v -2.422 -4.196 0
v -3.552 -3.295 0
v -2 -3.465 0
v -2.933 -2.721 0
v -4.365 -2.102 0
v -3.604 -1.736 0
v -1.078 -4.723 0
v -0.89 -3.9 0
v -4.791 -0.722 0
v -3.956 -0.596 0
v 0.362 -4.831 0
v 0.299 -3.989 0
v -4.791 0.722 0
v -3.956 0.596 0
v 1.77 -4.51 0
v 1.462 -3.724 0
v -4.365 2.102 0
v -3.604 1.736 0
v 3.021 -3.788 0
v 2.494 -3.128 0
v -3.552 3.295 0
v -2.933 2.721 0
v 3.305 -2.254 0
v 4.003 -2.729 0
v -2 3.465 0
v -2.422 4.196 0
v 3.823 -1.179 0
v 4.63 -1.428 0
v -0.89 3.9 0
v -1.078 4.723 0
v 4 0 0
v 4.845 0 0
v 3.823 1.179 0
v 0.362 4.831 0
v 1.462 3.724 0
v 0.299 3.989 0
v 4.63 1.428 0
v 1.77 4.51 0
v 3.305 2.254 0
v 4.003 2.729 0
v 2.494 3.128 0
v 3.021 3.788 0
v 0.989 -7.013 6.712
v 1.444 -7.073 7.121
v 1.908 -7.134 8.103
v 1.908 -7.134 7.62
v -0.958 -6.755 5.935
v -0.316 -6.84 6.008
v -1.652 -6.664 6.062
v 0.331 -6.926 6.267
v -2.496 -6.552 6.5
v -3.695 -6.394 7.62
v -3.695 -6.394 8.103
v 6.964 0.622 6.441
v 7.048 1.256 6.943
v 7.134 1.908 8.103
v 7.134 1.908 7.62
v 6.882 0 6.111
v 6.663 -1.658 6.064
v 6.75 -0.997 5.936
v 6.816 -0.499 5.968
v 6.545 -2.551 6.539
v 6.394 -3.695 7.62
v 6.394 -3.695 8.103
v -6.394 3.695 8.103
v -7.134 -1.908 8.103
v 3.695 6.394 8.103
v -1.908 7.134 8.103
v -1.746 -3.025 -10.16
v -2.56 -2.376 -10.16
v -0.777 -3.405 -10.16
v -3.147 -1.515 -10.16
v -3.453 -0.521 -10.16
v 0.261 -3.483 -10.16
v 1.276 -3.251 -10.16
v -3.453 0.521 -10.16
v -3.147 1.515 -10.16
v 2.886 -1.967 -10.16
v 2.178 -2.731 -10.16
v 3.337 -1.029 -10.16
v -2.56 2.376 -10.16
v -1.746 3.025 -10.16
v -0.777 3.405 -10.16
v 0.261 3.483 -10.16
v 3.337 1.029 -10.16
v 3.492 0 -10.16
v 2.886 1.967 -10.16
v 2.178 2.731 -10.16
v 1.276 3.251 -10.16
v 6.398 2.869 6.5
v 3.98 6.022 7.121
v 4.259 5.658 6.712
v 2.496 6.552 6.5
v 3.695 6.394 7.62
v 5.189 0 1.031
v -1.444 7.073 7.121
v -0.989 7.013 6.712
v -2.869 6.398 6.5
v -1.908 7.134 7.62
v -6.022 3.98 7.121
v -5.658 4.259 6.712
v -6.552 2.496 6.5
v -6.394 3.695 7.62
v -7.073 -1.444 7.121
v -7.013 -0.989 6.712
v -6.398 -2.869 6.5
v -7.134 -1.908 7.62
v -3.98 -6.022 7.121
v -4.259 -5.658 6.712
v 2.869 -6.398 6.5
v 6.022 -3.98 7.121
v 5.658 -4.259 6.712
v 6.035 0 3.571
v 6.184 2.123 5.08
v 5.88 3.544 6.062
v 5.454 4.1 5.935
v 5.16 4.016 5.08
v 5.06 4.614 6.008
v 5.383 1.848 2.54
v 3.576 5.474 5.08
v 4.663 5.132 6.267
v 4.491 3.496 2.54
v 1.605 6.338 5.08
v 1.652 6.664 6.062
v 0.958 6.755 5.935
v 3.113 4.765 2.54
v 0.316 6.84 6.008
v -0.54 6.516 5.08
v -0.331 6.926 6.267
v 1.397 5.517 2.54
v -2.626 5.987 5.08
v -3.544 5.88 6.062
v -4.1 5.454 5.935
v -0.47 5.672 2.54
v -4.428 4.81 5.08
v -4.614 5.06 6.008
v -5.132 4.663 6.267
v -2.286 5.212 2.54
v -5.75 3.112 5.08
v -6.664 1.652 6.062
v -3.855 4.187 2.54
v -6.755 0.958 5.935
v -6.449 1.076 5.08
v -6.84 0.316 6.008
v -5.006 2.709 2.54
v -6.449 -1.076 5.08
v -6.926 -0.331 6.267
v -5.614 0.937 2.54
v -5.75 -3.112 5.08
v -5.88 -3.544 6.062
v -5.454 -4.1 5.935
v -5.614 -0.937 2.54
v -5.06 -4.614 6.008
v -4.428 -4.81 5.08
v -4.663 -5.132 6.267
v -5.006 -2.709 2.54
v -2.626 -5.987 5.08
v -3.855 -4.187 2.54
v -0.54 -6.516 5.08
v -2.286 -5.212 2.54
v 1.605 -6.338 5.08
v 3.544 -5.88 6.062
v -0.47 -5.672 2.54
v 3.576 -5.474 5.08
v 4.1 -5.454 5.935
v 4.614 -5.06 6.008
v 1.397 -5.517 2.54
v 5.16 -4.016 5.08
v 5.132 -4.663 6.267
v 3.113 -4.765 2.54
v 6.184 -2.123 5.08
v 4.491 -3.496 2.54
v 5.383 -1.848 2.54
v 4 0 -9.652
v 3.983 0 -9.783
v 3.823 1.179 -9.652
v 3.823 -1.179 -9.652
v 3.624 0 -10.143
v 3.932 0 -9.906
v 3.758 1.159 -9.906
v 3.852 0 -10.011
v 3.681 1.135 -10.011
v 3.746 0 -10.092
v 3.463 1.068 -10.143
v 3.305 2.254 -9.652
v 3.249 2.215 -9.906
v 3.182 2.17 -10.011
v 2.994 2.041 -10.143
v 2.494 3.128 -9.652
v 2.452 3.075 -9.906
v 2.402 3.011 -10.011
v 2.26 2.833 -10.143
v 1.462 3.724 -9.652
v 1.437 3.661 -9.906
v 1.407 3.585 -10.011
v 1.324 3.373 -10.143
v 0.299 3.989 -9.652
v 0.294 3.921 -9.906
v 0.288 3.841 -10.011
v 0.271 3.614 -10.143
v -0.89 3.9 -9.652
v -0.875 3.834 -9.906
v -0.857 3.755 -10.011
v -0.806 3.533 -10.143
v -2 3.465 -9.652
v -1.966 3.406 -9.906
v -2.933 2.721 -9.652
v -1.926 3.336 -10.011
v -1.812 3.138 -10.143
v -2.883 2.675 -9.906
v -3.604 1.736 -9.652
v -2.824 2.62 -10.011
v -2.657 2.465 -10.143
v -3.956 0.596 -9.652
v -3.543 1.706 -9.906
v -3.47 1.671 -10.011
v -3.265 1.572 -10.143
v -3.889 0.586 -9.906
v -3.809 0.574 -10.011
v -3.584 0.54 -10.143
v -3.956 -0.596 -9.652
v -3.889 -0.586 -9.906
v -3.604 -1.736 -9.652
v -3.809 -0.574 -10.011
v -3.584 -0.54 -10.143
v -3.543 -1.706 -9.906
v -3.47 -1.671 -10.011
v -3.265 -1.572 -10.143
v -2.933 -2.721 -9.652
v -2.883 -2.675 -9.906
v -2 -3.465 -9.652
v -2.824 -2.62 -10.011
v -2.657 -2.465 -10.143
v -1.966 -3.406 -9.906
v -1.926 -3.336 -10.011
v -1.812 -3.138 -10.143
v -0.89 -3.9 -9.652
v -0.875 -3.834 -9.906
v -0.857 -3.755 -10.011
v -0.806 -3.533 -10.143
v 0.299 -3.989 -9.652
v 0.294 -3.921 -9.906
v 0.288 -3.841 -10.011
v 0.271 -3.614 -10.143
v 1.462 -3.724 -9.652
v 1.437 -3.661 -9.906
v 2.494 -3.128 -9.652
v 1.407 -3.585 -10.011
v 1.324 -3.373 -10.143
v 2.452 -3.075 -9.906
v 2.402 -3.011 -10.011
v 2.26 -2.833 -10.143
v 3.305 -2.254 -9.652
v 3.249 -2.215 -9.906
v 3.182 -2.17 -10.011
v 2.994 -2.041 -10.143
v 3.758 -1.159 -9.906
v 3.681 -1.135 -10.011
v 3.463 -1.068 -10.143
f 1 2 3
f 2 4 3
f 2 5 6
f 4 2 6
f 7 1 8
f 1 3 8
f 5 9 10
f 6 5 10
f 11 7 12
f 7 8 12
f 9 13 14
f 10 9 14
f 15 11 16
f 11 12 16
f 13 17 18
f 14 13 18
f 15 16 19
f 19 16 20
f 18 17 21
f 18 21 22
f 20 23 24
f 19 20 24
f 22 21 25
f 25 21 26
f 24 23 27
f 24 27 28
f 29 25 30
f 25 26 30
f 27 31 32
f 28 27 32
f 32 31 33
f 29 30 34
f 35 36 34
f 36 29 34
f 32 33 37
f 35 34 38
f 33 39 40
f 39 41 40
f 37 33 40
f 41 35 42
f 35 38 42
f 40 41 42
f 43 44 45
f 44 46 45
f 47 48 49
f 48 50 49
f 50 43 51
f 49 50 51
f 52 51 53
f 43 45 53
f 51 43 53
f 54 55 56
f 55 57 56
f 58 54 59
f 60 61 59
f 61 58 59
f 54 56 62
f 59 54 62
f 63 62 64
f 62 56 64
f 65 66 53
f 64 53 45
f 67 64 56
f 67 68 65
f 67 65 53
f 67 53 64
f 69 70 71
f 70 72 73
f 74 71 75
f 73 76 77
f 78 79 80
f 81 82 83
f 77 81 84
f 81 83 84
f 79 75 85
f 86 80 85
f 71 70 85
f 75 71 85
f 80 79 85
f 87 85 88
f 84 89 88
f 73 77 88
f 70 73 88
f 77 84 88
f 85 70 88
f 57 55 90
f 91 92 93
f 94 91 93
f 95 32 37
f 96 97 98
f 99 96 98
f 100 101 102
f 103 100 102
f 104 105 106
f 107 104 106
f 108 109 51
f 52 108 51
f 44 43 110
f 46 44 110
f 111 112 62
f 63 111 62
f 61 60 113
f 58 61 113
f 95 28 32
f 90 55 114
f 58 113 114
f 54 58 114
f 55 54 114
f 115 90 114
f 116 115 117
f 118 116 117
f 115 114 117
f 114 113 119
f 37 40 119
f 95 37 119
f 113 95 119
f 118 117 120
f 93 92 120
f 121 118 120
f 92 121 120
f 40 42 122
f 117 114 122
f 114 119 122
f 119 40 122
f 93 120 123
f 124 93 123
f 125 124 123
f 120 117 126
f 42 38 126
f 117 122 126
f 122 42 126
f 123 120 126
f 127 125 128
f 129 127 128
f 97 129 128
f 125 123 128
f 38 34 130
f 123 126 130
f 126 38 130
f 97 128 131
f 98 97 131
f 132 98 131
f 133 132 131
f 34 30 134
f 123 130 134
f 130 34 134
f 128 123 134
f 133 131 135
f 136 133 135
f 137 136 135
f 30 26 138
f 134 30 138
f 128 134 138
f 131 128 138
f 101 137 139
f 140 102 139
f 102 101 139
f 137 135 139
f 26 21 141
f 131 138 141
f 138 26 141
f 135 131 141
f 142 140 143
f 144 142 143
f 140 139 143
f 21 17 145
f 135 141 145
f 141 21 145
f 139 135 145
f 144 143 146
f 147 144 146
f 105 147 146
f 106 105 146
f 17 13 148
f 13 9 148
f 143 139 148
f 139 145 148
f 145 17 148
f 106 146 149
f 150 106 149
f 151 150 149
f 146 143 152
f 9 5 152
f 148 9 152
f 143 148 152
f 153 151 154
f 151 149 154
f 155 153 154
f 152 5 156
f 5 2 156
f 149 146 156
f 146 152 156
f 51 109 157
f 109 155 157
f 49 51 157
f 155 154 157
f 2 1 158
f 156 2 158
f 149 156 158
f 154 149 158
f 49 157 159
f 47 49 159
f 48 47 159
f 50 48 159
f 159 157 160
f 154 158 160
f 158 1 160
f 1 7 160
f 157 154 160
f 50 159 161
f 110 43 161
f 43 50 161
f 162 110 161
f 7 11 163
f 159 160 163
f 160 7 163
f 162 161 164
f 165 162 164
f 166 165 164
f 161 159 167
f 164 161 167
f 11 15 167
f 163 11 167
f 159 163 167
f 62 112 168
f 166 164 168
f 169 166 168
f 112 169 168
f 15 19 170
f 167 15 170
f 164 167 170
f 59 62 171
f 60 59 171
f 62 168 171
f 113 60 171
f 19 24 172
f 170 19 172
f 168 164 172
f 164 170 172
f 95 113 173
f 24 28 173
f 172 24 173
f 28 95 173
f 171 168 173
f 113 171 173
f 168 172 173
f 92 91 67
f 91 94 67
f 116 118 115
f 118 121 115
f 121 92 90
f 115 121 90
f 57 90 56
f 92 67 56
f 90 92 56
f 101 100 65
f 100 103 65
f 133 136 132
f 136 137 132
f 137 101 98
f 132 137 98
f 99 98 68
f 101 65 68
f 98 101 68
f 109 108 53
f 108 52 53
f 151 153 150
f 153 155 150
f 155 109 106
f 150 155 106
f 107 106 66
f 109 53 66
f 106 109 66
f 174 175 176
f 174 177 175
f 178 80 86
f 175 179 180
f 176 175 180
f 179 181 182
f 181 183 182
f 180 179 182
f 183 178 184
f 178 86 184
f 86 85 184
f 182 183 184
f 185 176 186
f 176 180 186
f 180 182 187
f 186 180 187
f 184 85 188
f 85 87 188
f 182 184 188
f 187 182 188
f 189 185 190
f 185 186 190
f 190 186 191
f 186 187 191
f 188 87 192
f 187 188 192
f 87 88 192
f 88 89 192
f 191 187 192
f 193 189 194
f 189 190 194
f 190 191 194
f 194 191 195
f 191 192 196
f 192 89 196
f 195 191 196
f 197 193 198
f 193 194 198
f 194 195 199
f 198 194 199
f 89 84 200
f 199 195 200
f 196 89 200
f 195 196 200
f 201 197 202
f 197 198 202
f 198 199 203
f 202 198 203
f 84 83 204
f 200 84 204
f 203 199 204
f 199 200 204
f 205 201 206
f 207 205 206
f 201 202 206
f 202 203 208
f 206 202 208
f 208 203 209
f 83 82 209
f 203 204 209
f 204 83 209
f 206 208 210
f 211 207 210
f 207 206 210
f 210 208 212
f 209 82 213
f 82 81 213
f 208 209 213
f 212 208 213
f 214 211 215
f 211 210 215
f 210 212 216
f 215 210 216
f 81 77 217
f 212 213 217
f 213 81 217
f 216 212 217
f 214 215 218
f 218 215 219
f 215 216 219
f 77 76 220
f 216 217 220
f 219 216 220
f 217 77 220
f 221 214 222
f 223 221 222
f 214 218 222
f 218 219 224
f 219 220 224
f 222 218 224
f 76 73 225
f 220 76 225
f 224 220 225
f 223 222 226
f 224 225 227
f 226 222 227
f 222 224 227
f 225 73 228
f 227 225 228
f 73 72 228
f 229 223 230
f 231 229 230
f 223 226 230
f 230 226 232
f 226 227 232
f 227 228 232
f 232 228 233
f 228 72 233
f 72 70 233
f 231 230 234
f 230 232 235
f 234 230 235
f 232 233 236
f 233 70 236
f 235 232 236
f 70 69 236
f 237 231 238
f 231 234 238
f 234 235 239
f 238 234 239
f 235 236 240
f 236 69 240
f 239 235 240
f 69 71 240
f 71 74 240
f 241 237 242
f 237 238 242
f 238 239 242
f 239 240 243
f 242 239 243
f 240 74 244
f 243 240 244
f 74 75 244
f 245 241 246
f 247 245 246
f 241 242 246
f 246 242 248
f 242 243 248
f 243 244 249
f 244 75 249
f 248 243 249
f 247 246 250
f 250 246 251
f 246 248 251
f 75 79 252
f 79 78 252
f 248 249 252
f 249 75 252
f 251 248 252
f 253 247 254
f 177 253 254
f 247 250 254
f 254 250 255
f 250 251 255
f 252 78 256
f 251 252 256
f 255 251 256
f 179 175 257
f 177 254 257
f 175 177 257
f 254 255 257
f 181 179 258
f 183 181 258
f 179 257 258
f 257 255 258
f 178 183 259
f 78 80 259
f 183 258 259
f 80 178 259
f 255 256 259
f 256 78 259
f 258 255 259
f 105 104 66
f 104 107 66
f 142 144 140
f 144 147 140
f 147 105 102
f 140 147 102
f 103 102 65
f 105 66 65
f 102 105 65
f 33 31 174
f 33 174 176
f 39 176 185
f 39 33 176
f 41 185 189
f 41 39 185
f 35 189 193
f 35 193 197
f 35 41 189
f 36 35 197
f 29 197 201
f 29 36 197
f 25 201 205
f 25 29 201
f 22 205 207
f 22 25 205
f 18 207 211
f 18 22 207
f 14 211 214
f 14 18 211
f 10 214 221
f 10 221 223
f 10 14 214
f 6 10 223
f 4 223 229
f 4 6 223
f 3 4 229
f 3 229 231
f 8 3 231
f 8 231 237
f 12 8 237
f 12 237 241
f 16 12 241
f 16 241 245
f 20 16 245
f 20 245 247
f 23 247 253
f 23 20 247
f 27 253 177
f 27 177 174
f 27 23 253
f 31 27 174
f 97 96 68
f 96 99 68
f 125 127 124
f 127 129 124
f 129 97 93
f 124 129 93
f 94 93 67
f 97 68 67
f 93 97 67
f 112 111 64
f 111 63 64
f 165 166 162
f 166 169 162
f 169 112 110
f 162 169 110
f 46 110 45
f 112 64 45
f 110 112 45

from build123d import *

# Parameters (mm, degrees)
F0_R     = 4.0005
F1_DEPTH = 10.16
F0_R_2   = 7.3848382985
F2_DEPTH = 8.1026
F3_SIZE2 = 2.54
F3_SIZE  = 7.62
F5_DEPTH = 25.4
F6_R     = 0.508


with BuildPart() as f1:
    # F0 (on Top) → F1 (new body)
    with BuildSketch(Plane.XY):
        Circle(F0_R)
    extrude(amount=-F1_DEPTH)

    # F0 (on Top) → F2 (join)
    with BuildSketch(Plane.XY):
        Circle(F0_R_2)
        Circle(F0_R, mode=Mode.SUBTRACT)
        Circle(F0_R)
    extrude(amount=F2_DEPTH)

    # F3
    f3_edges = [f1.edges().sort_by_distance(p)[0] for p in [
        (-7.384838, 0, 0),
    ]]
    f3_side = f1.faces().sort_by_distance((-7.384838, 0, 4.0513))[0]
    chamfer(f3_edges, length=F3_SIZE, length2=F3_SIZE2, reference=f3_side)

    # F4 (on face) → F5 (cut)
    with BuildSketch(Plane.XY.offset(8.1026)):
        with BuildLine():
            Line((-6.3938341113, 3.6952296345), (-1.9082015253, 7.1340453905))
            ThreePointArc((-1.9082015253, 7.1340453905), (-4.4930293098, 5.8607614109), (-6.3938341113, 3.6952296345))
        make_face()
        with BuildLine():
            Line((-1.9082015253, 7.1340453905), (3.6952296345, 6.3938341113))
            ThreePointArc((3.6952296345, 6.3938341113), (0.9671326435, 7.3212356296), (-1.9082015253, 7.1340453905))
        make_face()
        with BuildLine():
            Line((3.6952296345, 6.3938341113), (7.1340453905, 1.9082015253))
            ThreePointArc((7.1340453905, 1.9082015253), (5.8607614109, 4.4930293098), (3.6952296345, 6.3938341113))
        make_face()
        with BuildLine():
            Line((7.1340453905, 1.9082015253), (6.3938341113, -3.6952296345))
            ThreePointArc((6.3938341113, -3.6952296345), (7.1327858413, -1.9129042939), (7.3848382985, 0))
            ThreePointArc((7.3848382985, 0), (7.3218716295, 0.9623058433), (7.1340453905, 1.9082015253))
        make_face()
        with BuildLine():
            ThreePointArc((1.9082015253, -7.1340453905), (4.4930293098, -5.8607614109), (6.3938341113, -3.6952296345))
            Line((6.3938341113, -3.6952296345), (1.9082015253, -7.1340453905))
        make_face()
        with BuildLine():
            ThreePointArc((-3.6952296345, -6.3938341113), (-0.9671326435, -7.3212356296), (1.9082015253, -7.1340453905))
            Line((1.9082015253, -7.1340453905), (-3.6952296345, -6.3938341113))
        make_face()
        with BuildLine():
            ThreePointArc((-7.1340453905, -1.9082015253), (-5.8607614109, -4.4930293098), (-3.6952296345, -6.3938341113))
            Line((-3.6952296345, -6.3938341113), (-7.1340453905, -1.9082015253))
        make_face()
        with BuildLine():
            ThreePointArc((-6.3938341113, 3.6952296345), (-7.3212356296, 0.9671326435), (-7.1340453905, -1.9082015253))
            Line((-7.1340453905, -1.9082015253), (-6.3938341113, 3.6952296345))
        make_face()
    extrude(amount=-F5_DEPTH, mode=Mode.SUBTRACT)

    # F6
    f6_edges = [f1.edges().sort_by_distance(p)[0] for p in [
        (-4.0005, 0, -10.16),
    ]]
    fillet(f6_edges, radius=F6_R)


solid = f1.part
